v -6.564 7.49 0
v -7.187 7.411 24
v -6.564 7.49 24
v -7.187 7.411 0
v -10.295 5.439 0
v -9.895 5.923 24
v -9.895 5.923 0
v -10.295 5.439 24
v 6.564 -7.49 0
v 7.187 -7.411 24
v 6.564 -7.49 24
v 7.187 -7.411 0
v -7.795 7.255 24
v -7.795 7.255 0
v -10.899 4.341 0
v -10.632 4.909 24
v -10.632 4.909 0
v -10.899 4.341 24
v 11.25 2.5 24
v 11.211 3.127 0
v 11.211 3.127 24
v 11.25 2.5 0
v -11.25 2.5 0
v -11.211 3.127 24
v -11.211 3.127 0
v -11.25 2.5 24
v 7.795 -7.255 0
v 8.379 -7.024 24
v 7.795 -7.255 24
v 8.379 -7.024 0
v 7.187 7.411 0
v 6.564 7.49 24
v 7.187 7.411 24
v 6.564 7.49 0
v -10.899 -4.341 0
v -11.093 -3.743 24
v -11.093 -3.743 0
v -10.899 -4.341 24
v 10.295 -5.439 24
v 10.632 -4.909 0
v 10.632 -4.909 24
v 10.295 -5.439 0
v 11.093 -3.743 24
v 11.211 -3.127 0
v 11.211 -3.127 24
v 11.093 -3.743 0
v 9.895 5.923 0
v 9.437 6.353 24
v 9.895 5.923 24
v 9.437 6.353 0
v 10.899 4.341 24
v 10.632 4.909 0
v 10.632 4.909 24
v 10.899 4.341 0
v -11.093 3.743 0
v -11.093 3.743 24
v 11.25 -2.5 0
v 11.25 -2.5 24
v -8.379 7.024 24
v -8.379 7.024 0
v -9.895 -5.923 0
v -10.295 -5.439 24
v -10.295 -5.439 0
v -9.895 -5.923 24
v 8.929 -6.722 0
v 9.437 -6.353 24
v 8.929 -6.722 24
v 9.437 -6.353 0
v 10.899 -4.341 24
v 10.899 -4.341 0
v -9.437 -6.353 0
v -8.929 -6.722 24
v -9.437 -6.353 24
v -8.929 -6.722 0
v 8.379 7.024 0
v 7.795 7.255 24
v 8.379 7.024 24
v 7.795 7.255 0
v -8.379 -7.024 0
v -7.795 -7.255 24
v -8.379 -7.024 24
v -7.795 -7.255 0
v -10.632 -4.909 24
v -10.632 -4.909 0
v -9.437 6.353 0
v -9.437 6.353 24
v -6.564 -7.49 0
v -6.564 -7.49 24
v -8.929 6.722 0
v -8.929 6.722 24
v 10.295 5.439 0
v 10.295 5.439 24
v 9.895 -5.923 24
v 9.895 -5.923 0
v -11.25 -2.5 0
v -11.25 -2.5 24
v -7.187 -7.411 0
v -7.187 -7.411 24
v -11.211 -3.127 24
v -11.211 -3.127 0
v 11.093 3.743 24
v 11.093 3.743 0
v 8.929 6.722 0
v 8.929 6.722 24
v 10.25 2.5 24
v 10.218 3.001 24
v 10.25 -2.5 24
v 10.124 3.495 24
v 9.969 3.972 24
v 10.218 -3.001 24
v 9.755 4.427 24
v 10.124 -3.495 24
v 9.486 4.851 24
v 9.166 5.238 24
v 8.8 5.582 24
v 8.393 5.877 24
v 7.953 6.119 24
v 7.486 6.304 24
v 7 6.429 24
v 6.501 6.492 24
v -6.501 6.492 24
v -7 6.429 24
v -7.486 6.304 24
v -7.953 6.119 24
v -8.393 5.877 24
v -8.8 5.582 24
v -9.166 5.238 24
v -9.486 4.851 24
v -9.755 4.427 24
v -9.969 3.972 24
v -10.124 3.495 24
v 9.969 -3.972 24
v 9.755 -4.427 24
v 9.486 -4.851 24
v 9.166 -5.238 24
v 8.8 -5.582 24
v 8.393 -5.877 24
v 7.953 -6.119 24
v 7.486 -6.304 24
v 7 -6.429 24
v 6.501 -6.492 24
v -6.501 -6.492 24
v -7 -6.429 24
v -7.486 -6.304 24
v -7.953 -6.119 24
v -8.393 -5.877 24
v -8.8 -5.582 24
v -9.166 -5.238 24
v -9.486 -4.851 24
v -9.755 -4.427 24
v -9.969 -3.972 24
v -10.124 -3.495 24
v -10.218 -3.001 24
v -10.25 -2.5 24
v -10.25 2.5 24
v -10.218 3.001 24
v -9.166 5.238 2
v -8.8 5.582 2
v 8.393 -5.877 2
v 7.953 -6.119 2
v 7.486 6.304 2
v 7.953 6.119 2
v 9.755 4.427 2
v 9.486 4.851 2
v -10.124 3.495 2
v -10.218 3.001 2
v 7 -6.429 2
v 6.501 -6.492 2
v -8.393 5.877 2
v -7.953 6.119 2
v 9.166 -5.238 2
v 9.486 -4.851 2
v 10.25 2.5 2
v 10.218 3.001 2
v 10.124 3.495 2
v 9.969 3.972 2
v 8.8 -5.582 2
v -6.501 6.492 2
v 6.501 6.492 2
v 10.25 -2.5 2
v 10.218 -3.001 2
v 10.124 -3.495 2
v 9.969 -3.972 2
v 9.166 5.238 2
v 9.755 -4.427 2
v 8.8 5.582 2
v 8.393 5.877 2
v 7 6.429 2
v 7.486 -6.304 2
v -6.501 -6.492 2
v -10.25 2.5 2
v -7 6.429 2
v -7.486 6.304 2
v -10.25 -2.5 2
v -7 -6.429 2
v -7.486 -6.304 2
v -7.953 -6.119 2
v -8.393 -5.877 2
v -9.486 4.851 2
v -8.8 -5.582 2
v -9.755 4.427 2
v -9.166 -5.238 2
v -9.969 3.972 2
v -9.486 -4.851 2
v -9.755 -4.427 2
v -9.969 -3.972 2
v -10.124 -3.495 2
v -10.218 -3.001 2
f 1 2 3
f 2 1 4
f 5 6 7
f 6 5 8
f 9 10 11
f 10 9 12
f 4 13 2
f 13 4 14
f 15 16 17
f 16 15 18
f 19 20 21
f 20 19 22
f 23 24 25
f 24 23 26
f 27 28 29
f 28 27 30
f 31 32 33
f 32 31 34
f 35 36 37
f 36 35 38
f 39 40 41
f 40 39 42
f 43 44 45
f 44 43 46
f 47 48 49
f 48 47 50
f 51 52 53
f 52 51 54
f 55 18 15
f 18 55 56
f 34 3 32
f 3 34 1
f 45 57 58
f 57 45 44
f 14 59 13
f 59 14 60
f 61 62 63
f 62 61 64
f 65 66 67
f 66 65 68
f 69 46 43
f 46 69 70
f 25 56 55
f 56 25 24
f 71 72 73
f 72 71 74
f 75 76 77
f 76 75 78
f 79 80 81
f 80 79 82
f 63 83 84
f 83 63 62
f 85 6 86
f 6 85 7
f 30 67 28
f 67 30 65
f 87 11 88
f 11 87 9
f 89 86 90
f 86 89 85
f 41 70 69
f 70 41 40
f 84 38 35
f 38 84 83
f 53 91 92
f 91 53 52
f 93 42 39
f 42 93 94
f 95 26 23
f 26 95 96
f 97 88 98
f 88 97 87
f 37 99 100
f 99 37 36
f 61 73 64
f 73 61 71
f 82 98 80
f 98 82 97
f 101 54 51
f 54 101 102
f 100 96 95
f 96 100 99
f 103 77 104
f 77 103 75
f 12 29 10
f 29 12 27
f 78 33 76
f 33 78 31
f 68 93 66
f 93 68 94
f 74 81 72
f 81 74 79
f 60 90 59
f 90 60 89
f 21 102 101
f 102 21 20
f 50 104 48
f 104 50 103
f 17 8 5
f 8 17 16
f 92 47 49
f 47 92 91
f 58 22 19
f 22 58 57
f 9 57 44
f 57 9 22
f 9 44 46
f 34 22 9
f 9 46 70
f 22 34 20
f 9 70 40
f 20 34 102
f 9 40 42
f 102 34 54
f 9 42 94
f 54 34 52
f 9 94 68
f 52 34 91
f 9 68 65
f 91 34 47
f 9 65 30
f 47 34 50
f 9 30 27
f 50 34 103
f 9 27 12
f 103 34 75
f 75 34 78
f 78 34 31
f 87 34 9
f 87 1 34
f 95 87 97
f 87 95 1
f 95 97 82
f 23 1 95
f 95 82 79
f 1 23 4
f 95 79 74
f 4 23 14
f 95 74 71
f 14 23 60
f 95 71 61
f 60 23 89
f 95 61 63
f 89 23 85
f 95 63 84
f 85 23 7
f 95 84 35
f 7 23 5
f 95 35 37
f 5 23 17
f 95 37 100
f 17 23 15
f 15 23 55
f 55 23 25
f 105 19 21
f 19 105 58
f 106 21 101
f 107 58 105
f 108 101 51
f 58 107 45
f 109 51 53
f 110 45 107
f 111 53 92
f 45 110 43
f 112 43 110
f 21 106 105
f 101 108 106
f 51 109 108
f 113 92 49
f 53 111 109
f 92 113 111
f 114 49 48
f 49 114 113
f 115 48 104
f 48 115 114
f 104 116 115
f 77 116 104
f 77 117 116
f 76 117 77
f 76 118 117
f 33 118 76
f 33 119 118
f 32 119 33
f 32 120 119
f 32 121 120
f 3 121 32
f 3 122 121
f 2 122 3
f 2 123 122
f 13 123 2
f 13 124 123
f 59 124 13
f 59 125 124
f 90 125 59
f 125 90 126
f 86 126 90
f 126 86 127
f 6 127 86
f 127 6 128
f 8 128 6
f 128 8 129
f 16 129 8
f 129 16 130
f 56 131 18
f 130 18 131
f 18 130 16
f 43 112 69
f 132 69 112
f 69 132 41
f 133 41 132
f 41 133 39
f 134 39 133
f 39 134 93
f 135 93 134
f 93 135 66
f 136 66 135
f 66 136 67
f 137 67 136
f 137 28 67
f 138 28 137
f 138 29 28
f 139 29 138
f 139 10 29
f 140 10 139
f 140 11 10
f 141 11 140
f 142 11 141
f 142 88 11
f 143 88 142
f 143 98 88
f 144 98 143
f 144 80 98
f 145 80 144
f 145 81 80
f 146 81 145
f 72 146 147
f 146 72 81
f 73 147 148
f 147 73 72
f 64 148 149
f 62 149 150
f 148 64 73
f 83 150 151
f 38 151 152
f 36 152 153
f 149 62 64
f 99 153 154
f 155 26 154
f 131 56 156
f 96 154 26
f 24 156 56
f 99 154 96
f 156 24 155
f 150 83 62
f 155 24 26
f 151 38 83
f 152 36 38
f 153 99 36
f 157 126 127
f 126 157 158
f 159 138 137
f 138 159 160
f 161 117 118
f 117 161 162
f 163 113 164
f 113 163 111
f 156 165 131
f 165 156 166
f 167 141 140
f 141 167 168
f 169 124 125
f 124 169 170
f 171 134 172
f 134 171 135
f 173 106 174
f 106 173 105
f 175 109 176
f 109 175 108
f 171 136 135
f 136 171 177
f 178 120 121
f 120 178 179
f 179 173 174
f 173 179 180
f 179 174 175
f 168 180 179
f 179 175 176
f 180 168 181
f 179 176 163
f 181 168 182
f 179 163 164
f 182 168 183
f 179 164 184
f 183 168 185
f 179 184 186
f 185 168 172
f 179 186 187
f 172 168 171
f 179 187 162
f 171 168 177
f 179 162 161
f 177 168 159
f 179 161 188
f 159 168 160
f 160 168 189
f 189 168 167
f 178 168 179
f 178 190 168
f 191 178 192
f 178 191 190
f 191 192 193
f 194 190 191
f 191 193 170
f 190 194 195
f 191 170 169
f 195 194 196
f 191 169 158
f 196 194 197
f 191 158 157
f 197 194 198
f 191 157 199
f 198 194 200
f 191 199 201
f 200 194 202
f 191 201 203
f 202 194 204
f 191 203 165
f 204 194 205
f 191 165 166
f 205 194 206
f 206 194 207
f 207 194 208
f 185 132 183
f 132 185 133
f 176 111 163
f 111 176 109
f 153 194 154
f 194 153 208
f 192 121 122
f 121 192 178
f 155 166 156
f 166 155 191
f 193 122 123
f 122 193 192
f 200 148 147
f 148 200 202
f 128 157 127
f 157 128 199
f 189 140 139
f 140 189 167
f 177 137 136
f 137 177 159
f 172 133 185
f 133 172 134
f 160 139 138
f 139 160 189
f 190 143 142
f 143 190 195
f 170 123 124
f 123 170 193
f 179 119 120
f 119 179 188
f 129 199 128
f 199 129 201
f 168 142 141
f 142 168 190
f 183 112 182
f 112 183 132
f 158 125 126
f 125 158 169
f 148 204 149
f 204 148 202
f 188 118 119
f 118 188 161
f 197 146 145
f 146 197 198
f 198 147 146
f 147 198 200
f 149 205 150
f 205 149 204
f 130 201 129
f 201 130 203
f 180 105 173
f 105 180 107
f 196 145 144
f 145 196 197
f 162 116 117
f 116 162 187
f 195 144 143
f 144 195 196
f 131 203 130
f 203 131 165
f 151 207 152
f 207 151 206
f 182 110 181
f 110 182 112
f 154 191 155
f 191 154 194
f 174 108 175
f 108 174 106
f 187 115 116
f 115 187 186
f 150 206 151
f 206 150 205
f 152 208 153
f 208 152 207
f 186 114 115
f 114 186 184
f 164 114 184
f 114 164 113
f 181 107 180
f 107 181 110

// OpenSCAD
$fn = 50;


difference() {
	union() {
		hull() {
			translate(v = [-6.2500000000, 2.5000000000, 0]) {
				cylinder(h = 24, r = 5);
			}
			translate(v = [6.2500000000, 2.5000000000, 0]) {
				cylinder(h = 24, r = 5);
			}
			translate(v = [-6.2500000000, -2.5000000000, 0]) {
				cylinder(h = 24, r = 5);
			}
			translate(v = [6.2500000000, -2.5000000000, 0]) {
				cylinder(h = 24, r = 5);
			}
		}
	}
	union() {
		translate(v = [0, 0, 2]) {
			hull() {
				translate(v = [-6.2500000000, 2.5000000000, 0]) {
					cylinder(h = 22, r = 4);
				}
				translate(v = [6.2500000000, 2.5000000000, 0]) {
					cylinder(h = 22, r = 4);
				}
				translate(v = [-6.2500000000, -2.5000000000, 0]) {
					cylinder(h = 22, r = 4);
				}
				translate(v = [6.2500000000, -2.5000000000, 0]) {
					cylinder(h = 22, r = 4);
				}
			}
		}
	}
}
